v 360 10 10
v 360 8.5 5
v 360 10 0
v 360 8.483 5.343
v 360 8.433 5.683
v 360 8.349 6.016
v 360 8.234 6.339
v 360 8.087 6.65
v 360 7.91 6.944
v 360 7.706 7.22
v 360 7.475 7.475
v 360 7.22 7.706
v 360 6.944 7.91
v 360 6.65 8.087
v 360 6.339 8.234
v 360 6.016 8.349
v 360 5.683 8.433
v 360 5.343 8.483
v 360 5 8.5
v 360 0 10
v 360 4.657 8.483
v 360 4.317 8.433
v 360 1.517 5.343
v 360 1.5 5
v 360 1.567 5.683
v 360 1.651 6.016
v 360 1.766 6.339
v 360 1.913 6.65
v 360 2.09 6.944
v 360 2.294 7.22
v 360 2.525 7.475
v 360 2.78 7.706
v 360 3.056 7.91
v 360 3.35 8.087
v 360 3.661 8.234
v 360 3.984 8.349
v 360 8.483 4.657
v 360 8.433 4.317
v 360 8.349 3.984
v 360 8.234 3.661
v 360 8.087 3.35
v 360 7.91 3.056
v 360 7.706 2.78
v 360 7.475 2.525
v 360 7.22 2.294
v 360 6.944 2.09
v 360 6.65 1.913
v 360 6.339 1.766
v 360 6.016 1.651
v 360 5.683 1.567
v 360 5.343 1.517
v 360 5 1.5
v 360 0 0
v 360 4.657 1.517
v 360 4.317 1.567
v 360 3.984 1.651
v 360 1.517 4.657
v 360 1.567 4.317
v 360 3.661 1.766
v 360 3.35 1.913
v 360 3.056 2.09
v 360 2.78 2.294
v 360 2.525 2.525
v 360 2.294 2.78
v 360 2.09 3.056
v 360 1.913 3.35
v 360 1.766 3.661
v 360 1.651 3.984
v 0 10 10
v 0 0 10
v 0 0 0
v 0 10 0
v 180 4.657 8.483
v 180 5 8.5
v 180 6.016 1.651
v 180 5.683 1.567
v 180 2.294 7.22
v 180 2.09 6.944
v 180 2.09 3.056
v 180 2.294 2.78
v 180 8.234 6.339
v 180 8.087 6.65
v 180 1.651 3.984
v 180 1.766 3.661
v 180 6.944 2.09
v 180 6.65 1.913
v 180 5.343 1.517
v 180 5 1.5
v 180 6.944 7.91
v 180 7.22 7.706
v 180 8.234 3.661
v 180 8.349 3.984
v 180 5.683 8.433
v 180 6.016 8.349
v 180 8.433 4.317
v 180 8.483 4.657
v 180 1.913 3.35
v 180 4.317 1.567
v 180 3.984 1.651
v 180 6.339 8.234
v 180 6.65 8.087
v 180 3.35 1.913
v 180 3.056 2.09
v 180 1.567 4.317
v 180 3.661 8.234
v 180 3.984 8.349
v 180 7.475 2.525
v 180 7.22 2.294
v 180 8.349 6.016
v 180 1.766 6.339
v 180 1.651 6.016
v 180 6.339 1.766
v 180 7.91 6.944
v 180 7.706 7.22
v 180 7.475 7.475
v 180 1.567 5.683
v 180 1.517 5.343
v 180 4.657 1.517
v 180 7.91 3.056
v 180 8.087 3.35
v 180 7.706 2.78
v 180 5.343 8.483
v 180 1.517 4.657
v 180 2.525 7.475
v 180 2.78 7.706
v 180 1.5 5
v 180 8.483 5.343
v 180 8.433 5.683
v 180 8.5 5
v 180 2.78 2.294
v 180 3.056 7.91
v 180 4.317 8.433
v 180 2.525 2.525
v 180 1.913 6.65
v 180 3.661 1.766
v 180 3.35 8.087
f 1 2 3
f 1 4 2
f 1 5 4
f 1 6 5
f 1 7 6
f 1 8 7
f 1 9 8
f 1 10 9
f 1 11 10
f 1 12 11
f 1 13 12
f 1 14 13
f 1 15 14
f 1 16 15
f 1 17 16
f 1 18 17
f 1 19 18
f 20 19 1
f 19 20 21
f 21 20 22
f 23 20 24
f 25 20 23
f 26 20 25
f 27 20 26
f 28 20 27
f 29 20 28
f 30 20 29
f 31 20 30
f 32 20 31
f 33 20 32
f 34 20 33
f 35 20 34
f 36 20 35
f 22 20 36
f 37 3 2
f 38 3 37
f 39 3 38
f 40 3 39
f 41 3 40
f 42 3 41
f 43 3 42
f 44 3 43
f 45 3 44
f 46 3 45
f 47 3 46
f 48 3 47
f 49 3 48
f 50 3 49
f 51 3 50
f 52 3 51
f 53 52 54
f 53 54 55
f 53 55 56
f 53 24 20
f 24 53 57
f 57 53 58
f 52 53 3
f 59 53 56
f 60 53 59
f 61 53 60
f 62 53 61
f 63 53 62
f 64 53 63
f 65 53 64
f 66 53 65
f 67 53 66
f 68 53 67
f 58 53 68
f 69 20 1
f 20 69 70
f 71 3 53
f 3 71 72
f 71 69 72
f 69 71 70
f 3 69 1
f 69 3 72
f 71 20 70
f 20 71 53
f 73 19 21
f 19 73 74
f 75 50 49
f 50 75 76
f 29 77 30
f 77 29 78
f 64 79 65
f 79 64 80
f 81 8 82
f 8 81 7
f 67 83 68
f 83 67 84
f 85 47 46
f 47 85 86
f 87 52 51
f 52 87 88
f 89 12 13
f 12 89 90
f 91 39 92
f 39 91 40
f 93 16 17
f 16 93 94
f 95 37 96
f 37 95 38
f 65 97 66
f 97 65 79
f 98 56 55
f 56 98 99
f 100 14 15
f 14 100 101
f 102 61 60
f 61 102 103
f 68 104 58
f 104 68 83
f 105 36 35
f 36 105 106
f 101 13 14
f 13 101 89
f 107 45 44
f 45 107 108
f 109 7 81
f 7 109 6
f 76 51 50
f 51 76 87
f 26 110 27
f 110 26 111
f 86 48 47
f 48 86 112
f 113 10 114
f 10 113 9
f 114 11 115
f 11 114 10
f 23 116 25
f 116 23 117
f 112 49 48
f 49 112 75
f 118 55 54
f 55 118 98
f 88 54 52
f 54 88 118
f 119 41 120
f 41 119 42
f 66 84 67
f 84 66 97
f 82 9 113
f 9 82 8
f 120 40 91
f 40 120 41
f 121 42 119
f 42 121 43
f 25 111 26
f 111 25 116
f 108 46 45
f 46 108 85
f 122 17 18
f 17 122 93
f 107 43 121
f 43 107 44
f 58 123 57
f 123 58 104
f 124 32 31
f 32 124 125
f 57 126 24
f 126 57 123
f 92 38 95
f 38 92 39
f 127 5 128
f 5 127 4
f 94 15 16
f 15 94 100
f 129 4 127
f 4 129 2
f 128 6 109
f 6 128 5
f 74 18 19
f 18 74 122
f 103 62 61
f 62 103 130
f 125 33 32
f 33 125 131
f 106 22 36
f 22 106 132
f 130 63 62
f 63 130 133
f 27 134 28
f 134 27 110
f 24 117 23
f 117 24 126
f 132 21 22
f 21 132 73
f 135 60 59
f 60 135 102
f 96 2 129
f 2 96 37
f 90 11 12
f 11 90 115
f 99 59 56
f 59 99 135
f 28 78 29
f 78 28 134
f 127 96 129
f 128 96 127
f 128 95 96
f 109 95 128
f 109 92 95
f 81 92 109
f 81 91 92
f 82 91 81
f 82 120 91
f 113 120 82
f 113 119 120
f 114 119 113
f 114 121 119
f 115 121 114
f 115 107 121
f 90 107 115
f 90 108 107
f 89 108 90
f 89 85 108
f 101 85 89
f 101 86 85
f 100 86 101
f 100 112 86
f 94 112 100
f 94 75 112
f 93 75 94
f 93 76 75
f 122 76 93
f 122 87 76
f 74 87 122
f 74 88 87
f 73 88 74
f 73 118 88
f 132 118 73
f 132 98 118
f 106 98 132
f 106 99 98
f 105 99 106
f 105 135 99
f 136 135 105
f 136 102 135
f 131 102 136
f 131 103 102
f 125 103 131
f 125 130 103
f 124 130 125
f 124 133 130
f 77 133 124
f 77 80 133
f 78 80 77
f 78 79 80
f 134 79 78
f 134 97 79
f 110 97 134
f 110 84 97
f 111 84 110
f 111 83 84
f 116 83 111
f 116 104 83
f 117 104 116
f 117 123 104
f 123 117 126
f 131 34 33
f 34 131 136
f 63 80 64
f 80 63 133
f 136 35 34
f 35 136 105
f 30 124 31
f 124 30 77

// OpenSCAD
// column_half.scad (same; upper halves use the same geometry)

length = 360;
thk = 10;
hole_d = 7; // clearance for M6
$fn = 64;

module column_segment(len=length, t=thk, hd=hole_d) {
    difference() {
        translate([0,0,0]) cube([len, t, t]);
        translate([len/2, t/2, t/2]) rotate([0,90,0]) cylinder(r=hd/2, h=len + 20, $fn=$fn);
    }
}

column_segment();
